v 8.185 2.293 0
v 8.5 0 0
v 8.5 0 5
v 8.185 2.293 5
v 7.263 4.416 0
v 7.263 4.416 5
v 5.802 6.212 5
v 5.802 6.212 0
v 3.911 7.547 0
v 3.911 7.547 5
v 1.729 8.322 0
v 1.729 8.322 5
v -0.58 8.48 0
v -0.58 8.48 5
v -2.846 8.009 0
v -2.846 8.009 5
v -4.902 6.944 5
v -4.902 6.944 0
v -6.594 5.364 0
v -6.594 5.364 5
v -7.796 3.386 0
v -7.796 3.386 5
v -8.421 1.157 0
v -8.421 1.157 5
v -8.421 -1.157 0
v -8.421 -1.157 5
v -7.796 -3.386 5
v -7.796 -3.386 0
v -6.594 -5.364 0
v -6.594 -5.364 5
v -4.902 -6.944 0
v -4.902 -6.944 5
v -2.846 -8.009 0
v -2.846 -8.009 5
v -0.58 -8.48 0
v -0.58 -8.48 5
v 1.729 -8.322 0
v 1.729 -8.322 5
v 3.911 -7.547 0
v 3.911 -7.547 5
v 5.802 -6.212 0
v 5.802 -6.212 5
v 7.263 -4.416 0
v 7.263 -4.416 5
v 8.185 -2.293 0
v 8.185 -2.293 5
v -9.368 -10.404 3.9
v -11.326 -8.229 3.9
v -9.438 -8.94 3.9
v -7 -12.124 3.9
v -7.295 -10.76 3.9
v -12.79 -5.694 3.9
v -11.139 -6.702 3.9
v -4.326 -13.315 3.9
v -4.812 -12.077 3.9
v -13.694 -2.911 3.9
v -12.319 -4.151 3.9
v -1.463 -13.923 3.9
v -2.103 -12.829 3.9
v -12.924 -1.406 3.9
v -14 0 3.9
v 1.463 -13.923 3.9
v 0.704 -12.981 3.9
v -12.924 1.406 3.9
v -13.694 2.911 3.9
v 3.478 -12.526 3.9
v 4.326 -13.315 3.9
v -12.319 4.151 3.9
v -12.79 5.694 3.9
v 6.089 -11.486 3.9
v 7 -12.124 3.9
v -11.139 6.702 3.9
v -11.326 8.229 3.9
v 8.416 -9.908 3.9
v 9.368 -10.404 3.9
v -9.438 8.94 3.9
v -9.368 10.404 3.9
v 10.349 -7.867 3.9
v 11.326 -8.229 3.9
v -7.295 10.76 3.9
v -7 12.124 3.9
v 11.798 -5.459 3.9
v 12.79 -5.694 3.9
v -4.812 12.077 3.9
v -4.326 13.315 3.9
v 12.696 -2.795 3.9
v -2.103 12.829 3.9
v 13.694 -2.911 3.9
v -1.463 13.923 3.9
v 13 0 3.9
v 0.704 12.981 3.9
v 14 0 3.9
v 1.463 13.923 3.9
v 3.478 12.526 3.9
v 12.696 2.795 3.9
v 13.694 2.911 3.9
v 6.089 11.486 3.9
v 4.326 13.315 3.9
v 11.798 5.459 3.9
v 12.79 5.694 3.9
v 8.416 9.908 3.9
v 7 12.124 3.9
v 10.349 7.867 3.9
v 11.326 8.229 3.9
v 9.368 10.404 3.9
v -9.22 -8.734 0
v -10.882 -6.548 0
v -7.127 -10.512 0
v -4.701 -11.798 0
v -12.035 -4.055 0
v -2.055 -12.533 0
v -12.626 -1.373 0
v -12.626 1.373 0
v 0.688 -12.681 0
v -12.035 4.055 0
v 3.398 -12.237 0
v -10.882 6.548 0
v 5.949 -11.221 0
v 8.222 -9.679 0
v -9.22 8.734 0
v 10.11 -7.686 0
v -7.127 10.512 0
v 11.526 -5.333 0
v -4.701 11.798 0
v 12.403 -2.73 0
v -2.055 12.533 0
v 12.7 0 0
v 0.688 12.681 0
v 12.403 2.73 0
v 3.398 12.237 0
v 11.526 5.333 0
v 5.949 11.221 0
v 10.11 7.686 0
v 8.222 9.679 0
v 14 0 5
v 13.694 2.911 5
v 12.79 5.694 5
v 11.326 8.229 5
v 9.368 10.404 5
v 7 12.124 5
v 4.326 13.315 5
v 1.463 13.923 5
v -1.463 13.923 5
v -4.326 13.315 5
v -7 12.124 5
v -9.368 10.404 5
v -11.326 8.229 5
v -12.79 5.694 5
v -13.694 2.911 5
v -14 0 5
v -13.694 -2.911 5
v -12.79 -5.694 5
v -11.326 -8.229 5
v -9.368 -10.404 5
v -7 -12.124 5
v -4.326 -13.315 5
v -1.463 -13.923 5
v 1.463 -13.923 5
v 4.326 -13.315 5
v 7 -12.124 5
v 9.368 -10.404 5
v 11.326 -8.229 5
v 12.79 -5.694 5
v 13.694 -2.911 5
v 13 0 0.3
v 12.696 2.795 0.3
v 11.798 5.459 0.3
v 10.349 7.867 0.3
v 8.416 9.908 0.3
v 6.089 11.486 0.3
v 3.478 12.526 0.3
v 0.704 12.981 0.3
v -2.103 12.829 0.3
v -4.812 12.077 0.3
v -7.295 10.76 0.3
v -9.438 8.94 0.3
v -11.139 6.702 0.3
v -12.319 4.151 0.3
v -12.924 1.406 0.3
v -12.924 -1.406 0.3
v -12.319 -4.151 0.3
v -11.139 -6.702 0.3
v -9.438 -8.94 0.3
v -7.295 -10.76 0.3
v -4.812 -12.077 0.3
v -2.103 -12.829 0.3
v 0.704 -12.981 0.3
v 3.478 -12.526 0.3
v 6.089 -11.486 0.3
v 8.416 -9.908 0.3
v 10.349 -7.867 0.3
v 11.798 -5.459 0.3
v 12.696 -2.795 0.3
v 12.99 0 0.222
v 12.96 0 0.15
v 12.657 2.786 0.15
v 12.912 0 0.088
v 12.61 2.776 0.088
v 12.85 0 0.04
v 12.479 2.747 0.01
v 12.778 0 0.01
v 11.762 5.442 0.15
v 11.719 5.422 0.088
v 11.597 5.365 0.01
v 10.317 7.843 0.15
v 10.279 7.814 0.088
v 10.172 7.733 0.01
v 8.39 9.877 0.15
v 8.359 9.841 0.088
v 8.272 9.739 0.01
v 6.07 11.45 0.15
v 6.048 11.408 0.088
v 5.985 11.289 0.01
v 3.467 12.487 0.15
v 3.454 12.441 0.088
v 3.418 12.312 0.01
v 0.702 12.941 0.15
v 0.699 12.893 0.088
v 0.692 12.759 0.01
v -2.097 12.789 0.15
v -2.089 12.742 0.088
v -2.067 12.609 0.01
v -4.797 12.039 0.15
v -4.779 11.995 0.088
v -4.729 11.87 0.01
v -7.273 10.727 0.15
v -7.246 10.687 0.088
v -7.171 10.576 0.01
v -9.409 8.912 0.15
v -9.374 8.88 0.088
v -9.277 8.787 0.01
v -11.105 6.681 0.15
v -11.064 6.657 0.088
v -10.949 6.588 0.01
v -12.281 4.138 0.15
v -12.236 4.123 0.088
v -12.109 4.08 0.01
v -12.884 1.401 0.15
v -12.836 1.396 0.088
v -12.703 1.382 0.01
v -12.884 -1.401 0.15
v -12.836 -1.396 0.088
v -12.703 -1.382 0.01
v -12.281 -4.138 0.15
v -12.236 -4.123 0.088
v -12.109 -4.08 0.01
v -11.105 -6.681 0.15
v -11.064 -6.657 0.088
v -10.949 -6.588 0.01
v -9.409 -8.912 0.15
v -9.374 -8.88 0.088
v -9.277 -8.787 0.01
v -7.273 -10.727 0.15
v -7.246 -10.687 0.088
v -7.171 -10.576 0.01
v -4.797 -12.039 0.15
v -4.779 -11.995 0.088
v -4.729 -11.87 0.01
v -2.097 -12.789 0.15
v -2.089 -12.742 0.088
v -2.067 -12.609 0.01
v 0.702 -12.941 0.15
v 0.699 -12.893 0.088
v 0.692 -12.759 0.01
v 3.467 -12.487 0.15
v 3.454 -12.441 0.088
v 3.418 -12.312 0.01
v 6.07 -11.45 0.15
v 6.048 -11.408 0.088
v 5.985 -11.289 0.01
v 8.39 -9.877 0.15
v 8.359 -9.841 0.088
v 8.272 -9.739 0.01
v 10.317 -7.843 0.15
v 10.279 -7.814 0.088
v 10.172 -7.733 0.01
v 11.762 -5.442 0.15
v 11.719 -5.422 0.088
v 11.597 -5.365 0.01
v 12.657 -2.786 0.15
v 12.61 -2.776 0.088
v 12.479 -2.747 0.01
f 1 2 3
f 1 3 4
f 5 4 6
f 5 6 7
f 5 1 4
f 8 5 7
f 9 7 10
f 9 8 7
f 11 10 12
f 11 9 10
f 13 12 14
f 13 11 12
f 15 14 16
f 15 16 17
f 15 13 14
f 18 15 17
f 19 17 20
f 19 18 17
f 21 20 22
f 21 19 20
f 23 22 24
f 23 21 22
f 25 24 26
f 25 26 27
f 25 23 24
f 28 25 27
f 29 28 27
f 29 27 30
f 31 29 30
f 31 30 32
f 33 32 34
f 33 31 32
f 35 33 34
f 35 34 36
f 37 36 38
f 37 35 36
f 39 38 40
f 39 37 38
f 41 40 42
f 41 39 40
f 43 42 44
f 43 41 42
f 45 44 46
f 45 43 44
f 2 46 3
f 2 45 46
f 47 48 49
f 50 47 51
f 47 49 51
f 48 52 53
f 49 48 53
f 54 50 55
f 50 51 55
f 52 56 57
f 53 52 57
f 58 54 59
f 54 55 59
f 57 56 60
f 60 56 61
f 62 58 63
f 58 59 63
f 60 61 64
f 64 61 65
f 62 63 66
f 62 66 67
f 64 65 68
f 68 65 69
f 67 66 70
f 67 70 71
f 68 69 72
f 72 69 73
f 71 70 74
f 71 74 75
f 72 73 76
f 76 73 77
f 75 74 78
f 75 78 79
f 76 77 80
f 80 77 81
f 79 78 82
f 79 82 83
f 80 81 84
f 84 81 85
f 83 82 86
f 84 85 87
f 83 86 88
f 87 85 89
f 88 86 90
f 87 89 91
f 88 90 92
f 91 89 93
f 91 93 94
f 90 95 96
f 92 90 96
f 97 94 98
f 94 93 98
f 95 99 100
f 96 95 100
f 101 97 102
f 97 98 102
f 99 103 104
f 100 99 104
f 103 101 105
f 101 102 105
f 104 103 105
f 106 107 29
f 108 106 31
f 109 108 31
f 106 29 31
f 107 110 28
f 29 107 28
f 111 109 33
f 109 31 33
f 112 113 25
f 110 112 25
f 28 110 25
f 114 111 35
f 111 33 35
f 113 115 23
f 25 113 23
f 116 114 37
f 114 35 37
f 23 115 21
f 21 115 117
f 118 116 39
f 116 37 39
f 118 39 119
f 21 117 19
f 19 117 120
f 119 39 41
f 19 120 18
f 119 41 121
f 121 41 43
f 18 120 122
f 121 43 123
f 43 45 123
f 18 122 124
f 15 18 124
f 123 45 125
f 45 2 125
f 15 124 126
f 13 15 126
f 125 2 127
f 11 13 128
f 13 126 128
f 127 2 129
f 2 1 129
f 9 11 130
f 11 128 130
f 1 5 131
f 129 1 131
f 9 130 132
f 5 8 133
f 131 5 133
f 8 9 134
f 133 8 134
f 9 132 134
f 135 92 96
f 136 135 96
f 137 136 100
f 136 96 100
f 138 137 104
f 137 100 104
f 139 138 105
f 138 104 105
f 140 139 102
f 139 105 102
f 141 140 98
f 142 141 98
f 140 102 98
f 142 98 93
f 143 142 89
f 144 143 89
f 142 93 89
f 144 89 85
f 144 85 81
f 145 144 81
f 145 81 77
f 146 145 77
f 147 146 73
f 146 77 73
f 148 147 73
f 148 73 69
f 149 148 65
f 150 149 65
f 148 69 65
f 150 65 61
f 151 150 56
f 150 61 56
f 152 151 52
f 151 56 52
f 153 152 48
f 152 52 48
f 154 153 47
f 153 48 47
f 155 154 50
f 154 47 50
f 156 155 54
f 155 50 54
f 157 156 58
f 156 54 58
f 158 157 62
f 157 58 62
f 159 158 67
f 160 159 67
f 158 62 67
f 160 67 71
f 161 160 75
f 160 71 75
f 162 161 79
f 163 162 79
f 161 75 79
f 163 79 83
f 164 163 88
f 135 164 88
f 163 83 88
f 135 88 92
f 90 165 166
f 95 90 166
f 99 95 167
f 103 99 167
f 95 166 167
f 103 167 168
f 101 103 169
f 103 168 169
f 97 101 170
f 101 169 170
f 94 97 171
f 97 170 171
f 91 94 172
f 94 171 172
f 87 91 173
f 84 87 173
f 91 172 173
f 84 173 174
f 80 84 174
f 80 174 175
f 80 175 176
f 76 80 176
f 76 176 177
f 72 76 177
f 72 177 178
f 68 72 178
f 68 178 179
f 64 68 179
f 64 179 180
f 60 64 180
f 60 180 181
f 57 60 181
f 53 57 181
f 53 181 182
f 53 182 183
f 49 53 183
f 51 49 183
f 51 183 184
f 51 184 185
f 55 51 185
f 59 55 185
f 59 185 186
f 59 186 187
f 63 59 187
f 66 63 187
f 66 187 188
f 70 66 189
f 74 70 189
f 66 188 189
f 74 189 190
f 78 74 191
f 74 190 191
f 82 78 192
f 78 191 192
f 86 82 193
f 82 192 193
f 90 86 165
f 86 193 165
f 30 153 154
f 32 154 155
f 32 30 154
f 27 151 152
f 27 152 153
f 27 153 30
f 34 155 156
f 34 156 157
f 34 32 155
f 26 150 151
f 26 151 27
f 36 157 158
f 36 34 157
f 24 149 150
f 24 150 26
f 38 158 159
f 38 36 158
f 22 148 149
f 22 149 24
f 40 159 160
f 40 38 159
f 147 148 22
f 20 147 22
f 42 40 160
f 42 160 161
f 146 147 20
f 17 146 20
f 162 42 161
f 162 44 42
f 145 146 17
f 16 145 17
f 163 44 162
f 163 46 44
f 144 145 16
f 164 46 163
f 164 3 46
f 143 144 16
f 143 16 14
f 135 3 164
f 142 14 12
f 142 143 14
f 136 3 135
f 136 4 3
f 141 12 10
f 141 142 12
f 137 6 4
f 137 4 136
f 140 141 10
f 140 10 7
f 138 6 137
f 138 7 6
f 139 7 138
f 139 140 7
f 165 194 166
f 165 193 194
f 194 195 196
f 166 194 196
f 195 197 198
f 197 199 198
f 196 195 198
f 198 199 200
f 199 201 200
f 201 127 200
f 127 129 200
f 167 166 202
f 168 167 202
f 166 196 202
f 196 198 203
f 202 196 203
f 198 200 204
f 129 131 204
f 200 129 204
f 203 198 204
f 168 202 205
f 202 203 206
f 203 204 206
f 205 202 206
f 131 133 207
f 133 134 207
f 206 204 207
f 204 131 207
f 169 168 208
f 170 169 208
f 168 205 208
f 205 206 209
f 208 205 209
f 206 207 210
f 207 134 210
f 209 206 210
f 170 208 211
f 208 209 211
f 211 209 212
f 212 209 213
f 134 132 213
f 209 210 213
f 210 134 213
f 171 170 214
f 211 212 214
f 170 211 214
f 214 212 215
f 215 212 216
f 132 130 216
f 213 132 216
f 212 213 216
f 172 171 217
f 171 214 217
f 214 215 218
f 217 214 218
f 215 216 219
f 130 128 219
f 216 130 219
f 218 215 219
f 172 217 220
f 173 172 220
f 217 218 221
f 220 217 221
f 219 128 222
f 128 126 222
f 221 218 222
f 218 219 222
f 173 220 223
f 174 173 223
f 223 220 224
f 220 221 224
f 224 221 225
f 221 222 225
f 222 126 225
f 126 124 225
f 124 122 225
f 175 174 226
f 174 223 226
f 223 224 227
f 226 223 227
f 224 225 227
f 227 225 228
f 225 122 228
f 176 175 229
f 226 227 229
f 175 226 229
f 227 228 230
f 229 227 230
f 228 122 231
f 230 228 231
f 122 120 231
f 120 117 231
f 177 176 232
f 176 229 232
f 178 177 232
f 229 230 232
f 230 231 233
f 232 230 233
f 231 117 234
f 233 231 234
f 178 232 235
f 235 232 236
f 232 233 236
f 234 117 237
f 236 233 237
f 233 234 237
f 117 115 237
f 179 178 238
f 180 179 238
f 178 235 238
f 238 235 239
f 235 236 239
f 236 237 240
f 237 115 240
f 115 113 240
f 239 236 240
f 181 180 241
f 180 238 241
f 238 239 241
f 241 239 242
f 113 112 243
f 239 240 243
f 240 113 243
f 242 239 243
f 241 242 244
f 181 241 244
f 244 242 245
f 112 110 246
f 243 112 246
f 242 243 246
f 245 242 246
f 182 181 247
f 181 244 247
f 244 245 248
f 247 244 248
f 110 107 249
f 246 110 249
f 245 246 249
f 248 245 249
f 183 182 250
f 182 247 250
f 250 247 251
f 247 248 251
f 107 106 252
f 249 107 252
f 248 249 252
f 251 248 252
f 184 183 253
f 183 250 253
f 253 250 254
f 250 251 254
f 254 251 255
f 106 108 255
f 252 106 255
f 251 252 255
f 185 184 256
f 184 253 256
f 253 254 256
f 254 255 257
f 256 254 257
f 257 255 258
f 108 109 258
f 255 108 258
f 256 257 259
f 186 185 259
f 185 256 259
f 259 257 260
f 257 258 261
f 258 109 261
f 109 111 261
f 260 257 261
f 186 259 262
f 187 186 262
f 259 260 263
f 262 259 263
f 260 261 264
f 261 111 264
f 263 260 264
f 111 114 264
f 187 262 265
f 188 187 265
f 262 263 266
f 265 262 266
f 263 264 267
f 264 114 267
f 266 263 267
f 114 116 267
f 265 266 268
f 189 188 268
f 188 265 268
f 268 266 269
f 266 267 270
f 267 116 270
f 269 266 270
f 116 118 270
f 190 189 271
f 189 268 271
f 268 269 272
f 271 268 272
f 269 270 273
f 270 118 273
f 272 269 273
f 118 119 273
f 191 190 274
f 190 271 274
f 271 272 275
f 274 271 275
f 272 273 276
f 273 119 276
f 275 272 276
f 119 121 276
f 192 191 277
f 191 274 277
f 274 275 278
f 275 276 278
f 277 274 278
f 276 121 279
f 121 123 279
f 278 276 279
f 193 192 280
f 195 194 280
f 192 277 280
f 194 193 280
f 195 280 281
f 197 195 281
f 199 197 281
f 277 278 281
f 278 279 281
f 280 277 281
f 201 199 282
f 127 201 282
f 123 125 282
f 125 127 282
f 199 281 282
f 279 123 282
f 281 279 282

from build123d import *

# Parameters (mm, degrees)
SKETCH_1_R      = 13
SKETCH_1_R_2    = 8.5
EXTRUDE_1_DEPTH = 5
EXTRUDE_START   = -1.1
SKETCH_2_R      = 14
SKETCH_2_R_2    = 13
EXTRUDE_2_DEPTH = 1.1
FILLET_1_R      = 0.3


with BuildPart() as part:
    # 草图1 → 凸台-拉伸1 (new body)
    with BuildSketch(Plane.XY):
        Circle(SKETCH_1_R)
        Circle(SKETCH_1_R_2, mode=Mode.SUBTRACT)
    extrude(amount=EXTRUDE_1_DEPTH)

    # 草图2 → 凸台-拉伸2 (add)
    with BuildSketch(Plane.XY.offset(5).offset(EXTRUDE_START)):
        Circle(SKETCH_2_R)
        Circle(SKETCH_2_R_2, mode=Mode.SUBTRACT)
    extrude(amount=EXTRUDE_2_DEPTH)

    # 圆角1
    fillet_1_edges = [part.edges().sort_by_distance(p)[0] for p in [
        (-13, 0, 0),
    ]]
    fillet(fillet_1_edges, radius=FILLET_1_R)


solid = part.part
